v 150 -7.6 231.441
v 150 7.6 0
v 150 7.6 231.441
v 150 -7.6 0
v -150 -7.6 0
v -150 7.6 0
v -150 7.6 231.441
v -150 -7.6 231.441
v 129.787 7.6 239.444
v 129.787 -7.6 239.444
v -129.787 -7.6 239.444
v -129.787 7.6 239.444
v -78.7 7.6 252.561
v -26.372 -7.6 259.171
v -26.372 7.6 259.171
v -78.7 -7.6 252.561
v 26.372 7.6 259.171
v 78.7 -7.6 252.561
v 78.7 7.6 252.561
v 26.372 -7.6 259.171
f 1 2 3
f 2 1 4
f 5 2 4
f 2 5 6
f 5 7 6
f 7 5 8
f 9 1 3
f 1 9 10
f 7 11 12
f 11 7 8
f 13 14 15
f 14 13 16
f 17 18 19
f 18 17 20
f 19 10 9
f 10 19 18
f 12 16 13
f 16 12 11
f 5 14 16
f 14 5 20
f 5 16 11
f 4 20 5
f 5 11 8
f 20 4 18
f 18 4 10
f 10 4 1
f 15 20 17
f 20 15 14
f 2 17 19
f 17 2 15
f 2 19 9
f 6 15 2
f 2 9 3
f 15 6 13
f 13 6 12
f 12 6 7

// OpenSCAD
module kitchendoor(door_width=300, door_height=260,wall_thickness=15, wall_color=[0,0,1],wall_alpha=0.3)
{
    $fn = 50;
    r = 1.4 * door_width;
    dx = door_width / 2; 
    
    intersection() {
        color(wall_color,wall_alpha) 
        translate([0,0,door_height/2])
        cube([door_width, wall_thickness+0.4, door_height],center=true);
        
        color(wall_color,wall_alpha)
        translate([0,0, door_height - r])
        rotate([90,0,0]) 
        cylinder(h=wall_thickness+0.2, r=r, center=true); 
    }
}

// For testing
kitchendoor();
